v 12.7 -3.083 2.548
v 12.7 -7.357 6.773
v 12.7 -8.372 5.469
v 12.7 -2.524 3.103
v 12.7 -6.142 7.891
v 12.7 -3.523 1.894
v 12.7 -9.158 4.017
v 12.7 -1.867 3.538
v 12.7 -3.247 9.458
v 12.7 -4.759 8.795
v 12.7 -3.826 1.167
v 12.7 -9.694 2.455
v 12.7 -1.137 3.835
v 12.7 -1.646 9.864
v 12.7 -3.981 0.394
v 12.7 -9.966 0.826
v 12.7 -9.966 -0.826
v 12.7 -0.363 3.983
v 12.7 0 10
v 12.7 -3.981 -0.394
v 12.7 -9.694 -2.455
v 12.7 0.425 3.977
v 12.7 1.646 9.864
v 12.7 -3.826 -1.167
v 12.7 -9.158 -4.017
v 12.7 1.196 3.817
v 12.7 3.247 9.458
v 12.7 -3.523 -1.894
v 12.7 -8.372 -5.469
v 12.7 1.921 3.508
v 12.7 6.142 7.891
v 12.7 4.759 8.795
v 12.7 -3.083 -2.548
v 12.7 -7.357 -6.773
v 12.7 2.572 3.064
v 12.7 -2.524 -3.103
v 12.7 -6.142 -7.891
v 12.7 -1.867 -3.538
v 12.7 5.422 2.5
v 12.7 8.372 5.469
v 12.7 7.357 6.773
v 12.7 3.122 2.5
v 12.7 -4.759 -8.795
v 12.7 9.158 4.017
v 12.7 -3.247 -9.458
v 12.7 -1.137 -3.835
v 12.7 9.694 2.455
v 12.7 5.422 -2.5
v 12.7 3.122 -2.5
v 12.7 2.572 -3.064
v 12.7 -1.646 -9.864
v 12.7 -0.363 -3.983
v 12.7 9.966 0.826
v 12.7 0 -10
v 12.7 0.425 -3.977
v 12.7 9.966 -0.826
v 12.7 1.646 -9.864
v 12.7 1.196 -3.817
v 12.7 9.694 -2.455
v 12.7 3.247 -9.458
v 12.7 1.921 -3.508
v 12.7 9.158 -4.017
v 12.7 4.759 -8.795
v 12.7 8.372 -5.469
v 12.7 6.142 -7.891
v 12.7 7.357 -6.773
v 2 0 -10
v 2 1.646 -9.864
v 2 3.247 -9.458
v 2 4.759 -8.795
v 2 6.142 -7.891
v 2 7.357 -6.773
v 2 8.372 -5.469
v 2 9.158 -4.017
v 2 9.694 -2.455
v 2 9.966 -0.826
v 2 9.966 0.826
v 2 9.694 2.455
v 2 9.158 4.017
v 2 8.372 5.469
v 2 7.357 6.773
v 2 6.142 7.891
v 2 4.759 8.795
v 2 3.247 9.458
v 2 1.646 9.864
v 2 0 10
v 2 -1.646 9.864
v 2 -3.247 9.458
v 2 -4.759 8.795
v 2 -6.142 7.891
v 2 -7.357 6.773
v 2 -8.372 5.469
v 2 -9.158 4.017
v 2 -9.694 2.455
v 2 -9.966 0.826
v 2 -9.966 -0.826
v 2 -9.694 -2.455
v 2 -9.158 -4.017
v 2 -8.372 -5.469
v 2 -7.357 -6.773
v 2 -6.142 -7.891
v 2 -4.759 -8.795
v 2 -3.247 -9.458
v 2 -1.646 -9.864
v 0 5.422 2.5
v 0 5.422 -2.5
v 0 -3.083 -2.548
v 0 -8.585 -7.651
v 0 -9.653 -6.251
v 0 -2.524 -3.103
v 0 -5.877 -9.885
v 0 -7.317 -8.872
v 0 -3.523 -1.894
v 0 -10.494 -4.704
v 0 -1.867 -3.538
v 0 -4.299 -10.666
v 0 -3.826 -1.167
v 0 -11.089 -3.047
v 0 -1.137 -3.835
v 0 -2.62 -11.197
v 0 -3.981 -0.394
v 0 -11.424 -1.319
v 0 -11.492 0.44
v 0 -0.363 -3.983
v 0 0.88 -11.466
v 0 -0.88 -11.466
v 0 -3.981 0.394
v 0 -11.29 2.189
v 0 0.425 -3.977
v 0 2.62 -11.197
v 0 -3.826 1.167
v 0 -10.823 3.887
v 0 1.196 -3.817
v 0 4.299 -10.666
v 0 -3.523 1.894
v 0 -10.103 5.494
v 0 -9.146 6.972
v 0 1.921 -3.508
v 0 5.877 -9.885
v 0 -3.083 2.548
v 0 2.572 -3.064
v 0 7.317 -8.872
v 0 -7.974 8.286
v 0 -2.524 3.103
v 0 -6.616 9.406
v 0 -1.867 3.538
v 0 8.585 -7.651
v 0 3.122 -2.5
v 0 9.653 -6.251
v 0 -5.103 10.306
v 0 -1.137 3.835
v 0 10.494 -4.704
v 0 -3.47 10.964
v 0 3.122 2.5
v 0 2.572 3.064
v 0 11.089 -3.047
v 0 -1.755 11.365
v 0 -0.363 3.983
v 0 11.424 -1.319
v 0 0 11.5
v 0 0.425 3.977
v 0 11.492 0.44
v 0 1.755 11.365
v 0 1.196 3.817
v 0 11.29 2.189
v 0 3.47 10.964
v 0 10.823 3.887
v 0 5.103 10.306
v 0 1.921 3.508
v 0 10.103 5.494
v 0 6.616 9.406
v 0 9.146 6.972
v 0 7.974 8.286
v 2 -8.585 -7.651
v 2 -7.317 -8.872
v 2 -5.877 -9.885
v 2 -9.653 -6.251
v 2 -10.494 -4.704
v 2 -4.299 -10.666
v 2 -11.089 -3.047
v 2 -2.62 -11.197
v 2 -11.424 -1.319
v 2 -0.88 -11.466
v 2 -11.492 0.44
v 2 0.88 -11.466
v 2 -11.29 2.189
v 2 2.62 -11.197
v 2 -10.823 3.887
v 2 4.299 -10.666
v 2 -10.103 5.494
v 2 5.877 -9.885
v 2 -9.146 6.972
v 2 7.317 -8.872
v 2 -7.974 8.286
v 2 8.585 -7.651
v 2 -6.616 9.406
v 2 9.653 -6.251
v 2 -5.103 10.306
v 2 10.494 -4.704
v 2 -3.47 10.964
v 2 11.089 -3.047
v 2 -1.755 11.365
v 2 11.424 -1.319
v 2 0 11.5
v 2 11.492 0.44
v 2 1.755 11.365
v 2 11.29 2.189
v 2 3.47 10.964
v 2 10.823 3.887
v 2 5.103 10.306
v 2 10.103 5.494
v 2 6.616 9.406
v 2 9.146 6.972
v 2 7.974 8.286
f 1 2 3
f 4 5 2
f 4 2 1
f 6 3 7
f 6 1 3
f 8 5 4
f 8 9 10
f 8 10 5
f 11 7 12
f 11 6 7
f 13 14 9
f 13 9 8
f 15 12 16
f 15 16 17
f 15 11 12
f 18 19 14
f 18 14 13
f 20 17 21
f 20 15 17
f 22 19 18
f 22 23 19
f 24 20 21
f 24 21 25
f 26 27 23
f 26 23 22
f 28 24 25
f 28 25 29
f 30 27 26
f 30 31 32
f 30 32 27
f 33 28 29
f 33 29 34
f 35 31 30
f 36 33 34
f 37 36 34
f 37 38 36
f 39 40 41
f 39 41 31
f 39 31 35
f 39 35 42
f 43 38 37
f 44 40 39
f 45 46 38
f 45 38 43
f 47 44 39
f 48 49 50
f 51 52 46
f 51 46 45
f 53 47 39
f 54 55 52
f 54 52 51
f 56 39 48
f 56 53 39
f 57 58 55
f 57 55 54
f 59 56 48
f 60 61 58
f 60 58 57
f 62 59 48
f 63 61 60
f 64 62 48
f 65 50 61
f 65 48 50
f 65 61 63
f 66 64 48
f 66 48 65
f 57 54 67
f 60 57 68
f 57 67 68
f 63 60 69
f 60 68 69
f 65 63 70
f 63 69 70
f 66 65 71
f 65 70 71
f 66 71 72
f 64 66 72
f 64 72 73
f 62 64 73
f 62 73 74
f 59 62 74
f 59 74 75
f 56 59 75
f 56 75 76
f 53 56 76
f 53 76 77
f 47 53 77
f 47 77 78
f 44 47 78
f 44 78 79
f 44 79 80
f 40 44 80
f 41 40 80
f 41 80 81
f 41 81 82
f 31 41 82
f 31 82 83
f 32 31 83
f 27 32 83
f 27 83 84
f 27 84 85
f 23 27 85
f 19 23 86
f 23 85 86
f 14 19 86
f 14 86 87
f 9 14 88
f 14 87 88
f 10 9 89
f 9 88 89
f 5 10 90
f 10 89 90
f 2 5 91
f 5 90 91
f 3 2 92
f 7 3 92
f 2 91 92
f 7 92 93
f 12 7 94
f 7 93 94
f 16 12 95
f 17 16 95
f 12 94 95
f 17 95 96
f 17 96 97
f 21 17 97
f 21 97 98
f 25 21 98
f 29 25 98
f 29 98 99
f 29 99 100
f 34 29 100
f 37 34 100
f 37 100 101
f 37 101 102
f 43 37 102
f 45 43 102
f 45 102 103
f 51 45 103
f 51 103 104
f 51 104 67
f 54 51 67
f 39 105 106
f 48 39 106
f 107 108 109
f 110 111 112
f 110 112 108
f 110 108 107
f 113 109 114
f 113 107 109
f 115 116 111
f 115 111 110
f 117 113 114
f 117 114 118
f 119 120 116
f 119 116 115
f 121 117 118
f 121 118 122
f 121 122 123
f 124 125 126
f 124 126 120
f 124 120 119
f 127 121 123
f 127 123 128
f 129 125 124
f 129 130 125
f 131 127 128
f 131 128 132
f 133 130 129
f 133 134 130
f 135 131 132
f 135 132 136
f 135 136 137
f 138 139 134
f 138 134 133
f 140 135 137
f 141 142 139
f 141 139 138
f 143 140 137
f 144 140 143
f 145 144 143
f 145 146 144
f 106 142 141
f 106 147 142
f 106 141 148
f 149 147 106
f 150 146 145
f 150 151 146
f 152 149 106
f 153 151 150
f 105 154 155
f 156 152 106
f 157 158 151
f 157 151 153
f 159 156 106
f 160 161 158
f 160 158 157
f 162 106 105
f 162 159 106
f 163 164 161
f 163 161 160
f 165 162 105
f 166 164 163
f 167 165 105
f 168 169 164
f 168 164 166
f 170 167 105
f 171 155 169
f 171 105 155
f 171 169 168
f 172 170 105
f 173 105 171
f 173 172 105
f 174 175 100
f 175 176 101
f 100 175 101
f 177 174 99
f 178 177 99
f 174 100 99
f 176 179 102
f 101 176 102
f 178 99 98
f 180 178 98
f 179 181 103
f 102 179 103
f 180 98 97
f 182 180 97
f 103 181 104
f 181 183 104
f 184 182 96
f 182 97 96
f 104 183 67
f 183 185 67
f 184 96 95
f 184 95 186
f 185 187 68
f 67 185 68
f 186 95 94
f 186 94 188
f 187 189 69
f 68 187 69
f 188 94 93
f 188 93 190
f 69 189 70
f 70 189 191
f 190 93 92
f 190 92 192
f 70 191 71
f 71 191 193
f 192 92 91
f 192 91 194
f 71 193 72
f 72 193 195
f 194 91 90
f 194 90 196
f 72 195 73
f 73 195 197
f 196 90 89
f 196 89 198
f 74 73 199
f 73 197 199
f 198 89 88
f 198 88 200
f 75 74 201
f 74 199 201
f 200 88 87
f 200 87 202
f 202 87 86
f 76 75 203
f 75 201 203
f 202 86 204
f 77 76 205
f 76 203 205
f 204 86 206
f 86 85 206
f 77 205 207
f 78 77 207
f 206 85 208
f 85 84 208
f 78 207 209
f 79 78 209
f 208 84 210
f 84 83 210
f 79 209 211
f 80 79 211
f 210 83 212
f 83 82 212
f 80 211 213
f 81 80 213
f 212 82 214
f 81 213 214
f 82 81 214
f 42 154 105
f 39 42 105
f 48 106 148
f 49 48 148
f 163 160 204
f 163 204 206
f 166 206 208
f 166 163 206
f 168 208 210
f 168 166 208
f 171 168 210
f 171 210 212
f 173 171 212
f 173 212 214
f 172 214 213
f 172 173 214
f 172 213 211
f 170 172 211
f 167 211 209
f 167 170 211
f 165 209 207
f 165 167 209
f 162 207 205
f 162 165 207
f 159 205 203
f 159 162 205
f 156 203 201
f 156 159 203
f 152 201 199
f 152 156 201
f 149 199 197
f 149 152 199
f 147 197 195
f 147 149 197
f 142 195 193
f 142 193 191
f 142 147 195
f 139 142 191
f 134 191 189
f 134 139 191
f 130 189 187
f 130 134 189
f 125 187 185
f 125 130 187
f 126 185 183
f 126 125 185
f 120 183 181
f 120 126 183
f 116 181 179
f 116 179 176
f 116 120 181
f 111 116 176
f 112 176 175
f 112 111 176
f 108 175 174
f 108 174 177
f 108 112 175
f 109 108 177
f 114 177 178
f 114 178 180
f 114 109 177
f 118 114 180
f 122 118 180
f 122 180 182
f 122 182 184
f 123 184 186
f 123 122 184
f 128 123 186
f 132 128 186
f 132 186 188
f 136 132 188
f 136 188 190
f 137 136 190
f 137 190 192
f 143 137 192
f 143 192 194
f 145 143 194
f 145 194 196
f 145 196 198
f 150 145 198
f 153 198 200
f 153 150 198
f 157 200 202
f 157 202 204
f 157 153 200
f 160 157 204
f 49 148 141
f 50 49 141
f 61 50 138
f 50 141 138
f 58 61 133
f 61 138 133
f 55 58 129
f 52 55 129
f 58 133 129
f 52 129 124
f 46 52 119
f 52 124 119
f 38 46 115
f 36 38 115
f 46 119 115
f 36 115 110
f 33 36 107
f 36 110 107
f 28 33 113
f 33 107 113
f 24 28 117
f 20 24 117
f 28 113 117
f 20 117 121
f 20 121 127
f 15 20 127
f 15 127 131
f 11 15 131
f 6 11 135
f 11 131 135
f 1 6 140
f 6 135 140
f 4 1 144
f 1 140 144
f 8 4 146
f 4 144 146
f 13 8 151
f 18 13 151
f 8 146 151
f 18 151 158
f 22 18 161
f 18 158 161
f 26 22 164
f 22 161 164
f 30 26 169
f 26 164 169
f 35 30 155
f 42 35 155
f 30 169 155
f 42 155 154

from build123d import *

# Parameters (mm, degrees)
SKETCH1_R           = 10
BOSS_EXTRUDE1_DEPTH = 12.7
SKETCH2_R           = 11.5
SKETCH2_R_2         = 10
BOSS_EXTRUDE2_DEPTH = 2


with BuildPart() as part:
    # Sketch1 → Boss-Extrude1 (new body)
    with BuildSketch(Plane(origin=(0, 0, 0), x_dir=(0, 0, -1), z_dir=(1, 0, 0))):
        Circle(SKETCH1_R)
        with BuildLine():
            Line((-2.5, 5.422498999), (2.5, 5.422498999))
            Line((2.5, 5.422498999), (2.5, 3.122498999))
            ThreePointArc((2.5, 3.122498999), (0, -4), (-2.5, 3.122498999))
            Line((-2.5, 3.122498999), (-2.5, 5.422498999))
        make_face(mode=Mode.SUBTRACT)
    extrude(amount=BOSS_EXTRUDE1_DEPTH)

    # Sketch2 → Boss-Extrude2 (add)
    with BuildSketch(Plane.ZY):
        Circle(SKETCH2_R)
        Circle(SKETCH2_R_2, mode=Mode.SUBTRACT)
    extrude(amount=-BOSS_EXTRUDE2_DEPTH)


solid = part.part
